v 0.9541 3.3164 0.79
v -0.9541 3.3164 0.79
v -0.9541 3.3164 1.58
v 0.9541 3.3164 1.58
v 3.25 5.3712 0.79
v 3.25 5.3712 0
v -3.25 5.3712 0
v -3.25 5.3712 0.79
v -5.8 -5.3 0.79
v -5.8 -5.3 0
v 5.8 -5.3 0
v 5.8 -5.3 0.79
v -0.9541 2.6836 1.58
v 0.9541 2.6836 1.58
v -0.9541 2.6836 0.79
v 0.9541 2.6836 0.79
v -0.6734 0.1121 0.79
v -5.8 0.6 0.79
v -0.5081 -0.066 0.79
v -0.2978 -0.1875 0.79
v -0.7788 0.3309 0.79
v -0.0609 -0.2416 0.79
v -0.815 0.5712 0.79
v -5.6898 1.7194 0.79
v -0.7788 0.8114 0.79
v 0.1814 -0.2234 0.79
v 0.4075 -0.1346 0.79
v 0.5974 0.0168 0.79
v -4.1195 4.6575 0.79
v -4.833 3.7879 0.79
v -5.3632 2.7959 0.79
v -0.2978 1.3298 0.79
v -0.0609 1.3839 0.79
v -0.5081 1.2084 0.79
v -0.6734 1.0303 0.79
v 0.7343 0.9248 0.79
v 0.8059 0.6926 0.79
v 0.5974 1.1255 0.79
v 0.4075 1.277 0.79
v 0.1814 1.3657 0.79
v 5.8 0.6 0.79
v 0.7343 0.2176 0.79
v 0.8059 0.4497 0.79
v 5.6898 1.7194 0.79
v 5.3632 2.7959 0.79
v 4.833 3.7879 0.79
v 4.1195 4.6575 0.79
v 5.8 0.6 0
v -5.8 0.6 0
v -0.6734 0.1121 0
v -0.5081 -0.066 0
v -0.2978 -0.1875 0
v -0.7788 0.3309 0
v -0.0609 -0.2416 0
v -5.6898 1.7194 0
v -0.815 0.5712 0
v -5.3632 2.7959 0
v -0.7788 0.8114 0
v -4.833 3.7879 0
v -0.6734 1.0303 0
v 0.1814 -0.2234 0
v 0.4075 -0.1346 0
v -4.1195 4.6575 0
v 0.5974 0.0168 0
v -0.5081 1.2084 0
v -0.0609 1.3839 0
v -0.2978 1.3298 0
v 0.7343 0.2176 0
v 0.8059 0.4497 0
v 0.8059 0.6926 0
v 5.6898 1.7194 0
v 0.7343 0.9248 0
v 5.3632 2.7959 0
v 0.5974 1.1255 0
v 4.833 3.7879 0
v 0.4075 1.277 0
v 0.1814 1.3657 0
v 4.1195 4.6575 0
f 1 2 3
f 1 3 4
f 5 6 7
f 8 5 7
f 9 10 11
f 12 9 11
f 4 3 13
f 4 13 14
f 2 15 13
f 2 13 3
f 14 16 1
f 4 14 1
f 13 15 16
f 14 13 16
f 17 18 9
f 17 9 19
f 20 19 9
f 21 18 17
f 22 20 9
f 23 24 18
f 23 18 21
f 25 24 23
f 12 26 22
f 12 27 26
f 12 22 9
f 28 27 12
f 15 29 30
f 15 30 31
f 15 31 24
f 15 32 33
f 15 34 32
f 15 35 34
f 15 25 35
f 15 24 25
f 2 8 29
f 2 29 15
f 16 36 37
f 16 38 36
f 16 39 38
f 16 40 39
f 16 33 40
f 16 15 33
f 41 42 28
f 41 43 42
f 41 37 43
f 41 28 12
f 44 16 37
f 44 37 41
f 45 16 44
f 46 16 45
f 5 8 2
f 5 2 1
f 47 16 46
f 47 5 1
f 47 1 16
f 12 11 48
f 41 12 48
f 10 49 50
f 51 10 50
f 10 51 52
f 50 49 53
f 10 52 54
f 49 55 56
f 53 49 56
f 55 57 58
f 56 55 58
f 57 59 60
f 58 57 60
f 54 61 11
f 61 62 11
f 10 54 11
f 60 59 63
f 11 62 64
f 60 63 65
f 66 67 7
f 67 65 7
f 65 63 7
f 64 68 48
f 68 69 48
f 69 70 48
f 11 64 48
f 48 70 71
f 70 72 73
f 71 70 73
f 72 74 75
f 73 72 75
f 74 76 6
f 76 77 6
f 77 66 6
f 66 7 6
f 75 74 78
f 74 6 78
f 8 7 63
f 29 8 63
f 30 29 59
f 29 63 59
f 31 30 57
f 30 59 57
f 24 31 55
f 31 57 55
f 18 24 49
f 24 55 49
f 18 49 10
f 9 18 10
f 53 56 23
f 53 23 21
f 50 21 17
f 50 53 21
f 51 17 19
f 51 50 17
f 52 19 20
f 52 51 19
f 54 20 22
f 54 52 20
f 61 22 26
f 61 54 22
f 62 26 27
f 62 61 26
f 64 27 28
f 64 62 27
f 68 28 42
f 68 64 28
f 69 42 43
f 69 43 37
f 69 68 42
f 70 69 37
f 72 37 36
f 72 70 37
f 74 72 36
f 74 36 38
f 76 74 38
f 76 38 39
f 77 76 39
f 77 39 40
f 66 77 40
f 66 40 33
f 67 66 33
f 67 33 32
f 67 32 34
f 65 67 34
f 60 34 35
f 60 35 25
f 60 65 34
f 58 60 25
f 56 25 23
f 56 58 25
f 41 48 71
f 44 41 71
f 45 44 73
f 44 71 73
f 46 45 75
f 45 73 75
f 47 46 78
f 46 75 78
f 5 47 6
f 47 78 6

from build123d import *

# Parameters (mm, degrees)
SKETCH1_R           = 0.815
BOSS_EXTRUDE1_DEPTH = 0.79
SKETCH2_W           = 1.90810027
SKETCH2_H           = 0.63280283
BOSS_EXTRUDE2_DEPTH = 0.79


with BuildPart() as part:
    # Sketch1 → Boss-Extrude1 (new body)
    with BuildSketch(Plane.XY):
        with BuildLine():
            Line((-5.8, 0.599999942), (-5.8, -5.299999942))
            Line((-5.8, -5.299999942), (5.8, -5.299999942))
            Line((5.8, -5.299999942), (5.8, 0.599999942))
            ThreePointArc((5.8, 0.599999942), (5.12250756, 3.304927434), (3.249999977, 5.371166553))
            Line((3.249999977, 5.371166553), (-3.249999977, 5.371166553))
            ThreePointArc((-3.249999977, 5.371166553), (-5.12250756, 3.304927434), (-5.8, 0.599999942))
        make_face()
        with Locations(Location((0, 0.571166501, 0), (0, 0, 180))):
            Circle(SKETCH1_R, mode=Mode.SUBTRACT)
    extrude(amount=BOSS_EXTRUDE1_DEPTH)

    # Sketch2 → Boss-Extrude2 (add)
    with BuildSketch(Plane.XY.offset(0.79)):
        with Locations((0, 3)):
            Rectangle(SKETCH2_W, SKETCH2_H)
    extrude(amount=BOSS_EXTRUDE2_DEPTH)


solid = part.part
